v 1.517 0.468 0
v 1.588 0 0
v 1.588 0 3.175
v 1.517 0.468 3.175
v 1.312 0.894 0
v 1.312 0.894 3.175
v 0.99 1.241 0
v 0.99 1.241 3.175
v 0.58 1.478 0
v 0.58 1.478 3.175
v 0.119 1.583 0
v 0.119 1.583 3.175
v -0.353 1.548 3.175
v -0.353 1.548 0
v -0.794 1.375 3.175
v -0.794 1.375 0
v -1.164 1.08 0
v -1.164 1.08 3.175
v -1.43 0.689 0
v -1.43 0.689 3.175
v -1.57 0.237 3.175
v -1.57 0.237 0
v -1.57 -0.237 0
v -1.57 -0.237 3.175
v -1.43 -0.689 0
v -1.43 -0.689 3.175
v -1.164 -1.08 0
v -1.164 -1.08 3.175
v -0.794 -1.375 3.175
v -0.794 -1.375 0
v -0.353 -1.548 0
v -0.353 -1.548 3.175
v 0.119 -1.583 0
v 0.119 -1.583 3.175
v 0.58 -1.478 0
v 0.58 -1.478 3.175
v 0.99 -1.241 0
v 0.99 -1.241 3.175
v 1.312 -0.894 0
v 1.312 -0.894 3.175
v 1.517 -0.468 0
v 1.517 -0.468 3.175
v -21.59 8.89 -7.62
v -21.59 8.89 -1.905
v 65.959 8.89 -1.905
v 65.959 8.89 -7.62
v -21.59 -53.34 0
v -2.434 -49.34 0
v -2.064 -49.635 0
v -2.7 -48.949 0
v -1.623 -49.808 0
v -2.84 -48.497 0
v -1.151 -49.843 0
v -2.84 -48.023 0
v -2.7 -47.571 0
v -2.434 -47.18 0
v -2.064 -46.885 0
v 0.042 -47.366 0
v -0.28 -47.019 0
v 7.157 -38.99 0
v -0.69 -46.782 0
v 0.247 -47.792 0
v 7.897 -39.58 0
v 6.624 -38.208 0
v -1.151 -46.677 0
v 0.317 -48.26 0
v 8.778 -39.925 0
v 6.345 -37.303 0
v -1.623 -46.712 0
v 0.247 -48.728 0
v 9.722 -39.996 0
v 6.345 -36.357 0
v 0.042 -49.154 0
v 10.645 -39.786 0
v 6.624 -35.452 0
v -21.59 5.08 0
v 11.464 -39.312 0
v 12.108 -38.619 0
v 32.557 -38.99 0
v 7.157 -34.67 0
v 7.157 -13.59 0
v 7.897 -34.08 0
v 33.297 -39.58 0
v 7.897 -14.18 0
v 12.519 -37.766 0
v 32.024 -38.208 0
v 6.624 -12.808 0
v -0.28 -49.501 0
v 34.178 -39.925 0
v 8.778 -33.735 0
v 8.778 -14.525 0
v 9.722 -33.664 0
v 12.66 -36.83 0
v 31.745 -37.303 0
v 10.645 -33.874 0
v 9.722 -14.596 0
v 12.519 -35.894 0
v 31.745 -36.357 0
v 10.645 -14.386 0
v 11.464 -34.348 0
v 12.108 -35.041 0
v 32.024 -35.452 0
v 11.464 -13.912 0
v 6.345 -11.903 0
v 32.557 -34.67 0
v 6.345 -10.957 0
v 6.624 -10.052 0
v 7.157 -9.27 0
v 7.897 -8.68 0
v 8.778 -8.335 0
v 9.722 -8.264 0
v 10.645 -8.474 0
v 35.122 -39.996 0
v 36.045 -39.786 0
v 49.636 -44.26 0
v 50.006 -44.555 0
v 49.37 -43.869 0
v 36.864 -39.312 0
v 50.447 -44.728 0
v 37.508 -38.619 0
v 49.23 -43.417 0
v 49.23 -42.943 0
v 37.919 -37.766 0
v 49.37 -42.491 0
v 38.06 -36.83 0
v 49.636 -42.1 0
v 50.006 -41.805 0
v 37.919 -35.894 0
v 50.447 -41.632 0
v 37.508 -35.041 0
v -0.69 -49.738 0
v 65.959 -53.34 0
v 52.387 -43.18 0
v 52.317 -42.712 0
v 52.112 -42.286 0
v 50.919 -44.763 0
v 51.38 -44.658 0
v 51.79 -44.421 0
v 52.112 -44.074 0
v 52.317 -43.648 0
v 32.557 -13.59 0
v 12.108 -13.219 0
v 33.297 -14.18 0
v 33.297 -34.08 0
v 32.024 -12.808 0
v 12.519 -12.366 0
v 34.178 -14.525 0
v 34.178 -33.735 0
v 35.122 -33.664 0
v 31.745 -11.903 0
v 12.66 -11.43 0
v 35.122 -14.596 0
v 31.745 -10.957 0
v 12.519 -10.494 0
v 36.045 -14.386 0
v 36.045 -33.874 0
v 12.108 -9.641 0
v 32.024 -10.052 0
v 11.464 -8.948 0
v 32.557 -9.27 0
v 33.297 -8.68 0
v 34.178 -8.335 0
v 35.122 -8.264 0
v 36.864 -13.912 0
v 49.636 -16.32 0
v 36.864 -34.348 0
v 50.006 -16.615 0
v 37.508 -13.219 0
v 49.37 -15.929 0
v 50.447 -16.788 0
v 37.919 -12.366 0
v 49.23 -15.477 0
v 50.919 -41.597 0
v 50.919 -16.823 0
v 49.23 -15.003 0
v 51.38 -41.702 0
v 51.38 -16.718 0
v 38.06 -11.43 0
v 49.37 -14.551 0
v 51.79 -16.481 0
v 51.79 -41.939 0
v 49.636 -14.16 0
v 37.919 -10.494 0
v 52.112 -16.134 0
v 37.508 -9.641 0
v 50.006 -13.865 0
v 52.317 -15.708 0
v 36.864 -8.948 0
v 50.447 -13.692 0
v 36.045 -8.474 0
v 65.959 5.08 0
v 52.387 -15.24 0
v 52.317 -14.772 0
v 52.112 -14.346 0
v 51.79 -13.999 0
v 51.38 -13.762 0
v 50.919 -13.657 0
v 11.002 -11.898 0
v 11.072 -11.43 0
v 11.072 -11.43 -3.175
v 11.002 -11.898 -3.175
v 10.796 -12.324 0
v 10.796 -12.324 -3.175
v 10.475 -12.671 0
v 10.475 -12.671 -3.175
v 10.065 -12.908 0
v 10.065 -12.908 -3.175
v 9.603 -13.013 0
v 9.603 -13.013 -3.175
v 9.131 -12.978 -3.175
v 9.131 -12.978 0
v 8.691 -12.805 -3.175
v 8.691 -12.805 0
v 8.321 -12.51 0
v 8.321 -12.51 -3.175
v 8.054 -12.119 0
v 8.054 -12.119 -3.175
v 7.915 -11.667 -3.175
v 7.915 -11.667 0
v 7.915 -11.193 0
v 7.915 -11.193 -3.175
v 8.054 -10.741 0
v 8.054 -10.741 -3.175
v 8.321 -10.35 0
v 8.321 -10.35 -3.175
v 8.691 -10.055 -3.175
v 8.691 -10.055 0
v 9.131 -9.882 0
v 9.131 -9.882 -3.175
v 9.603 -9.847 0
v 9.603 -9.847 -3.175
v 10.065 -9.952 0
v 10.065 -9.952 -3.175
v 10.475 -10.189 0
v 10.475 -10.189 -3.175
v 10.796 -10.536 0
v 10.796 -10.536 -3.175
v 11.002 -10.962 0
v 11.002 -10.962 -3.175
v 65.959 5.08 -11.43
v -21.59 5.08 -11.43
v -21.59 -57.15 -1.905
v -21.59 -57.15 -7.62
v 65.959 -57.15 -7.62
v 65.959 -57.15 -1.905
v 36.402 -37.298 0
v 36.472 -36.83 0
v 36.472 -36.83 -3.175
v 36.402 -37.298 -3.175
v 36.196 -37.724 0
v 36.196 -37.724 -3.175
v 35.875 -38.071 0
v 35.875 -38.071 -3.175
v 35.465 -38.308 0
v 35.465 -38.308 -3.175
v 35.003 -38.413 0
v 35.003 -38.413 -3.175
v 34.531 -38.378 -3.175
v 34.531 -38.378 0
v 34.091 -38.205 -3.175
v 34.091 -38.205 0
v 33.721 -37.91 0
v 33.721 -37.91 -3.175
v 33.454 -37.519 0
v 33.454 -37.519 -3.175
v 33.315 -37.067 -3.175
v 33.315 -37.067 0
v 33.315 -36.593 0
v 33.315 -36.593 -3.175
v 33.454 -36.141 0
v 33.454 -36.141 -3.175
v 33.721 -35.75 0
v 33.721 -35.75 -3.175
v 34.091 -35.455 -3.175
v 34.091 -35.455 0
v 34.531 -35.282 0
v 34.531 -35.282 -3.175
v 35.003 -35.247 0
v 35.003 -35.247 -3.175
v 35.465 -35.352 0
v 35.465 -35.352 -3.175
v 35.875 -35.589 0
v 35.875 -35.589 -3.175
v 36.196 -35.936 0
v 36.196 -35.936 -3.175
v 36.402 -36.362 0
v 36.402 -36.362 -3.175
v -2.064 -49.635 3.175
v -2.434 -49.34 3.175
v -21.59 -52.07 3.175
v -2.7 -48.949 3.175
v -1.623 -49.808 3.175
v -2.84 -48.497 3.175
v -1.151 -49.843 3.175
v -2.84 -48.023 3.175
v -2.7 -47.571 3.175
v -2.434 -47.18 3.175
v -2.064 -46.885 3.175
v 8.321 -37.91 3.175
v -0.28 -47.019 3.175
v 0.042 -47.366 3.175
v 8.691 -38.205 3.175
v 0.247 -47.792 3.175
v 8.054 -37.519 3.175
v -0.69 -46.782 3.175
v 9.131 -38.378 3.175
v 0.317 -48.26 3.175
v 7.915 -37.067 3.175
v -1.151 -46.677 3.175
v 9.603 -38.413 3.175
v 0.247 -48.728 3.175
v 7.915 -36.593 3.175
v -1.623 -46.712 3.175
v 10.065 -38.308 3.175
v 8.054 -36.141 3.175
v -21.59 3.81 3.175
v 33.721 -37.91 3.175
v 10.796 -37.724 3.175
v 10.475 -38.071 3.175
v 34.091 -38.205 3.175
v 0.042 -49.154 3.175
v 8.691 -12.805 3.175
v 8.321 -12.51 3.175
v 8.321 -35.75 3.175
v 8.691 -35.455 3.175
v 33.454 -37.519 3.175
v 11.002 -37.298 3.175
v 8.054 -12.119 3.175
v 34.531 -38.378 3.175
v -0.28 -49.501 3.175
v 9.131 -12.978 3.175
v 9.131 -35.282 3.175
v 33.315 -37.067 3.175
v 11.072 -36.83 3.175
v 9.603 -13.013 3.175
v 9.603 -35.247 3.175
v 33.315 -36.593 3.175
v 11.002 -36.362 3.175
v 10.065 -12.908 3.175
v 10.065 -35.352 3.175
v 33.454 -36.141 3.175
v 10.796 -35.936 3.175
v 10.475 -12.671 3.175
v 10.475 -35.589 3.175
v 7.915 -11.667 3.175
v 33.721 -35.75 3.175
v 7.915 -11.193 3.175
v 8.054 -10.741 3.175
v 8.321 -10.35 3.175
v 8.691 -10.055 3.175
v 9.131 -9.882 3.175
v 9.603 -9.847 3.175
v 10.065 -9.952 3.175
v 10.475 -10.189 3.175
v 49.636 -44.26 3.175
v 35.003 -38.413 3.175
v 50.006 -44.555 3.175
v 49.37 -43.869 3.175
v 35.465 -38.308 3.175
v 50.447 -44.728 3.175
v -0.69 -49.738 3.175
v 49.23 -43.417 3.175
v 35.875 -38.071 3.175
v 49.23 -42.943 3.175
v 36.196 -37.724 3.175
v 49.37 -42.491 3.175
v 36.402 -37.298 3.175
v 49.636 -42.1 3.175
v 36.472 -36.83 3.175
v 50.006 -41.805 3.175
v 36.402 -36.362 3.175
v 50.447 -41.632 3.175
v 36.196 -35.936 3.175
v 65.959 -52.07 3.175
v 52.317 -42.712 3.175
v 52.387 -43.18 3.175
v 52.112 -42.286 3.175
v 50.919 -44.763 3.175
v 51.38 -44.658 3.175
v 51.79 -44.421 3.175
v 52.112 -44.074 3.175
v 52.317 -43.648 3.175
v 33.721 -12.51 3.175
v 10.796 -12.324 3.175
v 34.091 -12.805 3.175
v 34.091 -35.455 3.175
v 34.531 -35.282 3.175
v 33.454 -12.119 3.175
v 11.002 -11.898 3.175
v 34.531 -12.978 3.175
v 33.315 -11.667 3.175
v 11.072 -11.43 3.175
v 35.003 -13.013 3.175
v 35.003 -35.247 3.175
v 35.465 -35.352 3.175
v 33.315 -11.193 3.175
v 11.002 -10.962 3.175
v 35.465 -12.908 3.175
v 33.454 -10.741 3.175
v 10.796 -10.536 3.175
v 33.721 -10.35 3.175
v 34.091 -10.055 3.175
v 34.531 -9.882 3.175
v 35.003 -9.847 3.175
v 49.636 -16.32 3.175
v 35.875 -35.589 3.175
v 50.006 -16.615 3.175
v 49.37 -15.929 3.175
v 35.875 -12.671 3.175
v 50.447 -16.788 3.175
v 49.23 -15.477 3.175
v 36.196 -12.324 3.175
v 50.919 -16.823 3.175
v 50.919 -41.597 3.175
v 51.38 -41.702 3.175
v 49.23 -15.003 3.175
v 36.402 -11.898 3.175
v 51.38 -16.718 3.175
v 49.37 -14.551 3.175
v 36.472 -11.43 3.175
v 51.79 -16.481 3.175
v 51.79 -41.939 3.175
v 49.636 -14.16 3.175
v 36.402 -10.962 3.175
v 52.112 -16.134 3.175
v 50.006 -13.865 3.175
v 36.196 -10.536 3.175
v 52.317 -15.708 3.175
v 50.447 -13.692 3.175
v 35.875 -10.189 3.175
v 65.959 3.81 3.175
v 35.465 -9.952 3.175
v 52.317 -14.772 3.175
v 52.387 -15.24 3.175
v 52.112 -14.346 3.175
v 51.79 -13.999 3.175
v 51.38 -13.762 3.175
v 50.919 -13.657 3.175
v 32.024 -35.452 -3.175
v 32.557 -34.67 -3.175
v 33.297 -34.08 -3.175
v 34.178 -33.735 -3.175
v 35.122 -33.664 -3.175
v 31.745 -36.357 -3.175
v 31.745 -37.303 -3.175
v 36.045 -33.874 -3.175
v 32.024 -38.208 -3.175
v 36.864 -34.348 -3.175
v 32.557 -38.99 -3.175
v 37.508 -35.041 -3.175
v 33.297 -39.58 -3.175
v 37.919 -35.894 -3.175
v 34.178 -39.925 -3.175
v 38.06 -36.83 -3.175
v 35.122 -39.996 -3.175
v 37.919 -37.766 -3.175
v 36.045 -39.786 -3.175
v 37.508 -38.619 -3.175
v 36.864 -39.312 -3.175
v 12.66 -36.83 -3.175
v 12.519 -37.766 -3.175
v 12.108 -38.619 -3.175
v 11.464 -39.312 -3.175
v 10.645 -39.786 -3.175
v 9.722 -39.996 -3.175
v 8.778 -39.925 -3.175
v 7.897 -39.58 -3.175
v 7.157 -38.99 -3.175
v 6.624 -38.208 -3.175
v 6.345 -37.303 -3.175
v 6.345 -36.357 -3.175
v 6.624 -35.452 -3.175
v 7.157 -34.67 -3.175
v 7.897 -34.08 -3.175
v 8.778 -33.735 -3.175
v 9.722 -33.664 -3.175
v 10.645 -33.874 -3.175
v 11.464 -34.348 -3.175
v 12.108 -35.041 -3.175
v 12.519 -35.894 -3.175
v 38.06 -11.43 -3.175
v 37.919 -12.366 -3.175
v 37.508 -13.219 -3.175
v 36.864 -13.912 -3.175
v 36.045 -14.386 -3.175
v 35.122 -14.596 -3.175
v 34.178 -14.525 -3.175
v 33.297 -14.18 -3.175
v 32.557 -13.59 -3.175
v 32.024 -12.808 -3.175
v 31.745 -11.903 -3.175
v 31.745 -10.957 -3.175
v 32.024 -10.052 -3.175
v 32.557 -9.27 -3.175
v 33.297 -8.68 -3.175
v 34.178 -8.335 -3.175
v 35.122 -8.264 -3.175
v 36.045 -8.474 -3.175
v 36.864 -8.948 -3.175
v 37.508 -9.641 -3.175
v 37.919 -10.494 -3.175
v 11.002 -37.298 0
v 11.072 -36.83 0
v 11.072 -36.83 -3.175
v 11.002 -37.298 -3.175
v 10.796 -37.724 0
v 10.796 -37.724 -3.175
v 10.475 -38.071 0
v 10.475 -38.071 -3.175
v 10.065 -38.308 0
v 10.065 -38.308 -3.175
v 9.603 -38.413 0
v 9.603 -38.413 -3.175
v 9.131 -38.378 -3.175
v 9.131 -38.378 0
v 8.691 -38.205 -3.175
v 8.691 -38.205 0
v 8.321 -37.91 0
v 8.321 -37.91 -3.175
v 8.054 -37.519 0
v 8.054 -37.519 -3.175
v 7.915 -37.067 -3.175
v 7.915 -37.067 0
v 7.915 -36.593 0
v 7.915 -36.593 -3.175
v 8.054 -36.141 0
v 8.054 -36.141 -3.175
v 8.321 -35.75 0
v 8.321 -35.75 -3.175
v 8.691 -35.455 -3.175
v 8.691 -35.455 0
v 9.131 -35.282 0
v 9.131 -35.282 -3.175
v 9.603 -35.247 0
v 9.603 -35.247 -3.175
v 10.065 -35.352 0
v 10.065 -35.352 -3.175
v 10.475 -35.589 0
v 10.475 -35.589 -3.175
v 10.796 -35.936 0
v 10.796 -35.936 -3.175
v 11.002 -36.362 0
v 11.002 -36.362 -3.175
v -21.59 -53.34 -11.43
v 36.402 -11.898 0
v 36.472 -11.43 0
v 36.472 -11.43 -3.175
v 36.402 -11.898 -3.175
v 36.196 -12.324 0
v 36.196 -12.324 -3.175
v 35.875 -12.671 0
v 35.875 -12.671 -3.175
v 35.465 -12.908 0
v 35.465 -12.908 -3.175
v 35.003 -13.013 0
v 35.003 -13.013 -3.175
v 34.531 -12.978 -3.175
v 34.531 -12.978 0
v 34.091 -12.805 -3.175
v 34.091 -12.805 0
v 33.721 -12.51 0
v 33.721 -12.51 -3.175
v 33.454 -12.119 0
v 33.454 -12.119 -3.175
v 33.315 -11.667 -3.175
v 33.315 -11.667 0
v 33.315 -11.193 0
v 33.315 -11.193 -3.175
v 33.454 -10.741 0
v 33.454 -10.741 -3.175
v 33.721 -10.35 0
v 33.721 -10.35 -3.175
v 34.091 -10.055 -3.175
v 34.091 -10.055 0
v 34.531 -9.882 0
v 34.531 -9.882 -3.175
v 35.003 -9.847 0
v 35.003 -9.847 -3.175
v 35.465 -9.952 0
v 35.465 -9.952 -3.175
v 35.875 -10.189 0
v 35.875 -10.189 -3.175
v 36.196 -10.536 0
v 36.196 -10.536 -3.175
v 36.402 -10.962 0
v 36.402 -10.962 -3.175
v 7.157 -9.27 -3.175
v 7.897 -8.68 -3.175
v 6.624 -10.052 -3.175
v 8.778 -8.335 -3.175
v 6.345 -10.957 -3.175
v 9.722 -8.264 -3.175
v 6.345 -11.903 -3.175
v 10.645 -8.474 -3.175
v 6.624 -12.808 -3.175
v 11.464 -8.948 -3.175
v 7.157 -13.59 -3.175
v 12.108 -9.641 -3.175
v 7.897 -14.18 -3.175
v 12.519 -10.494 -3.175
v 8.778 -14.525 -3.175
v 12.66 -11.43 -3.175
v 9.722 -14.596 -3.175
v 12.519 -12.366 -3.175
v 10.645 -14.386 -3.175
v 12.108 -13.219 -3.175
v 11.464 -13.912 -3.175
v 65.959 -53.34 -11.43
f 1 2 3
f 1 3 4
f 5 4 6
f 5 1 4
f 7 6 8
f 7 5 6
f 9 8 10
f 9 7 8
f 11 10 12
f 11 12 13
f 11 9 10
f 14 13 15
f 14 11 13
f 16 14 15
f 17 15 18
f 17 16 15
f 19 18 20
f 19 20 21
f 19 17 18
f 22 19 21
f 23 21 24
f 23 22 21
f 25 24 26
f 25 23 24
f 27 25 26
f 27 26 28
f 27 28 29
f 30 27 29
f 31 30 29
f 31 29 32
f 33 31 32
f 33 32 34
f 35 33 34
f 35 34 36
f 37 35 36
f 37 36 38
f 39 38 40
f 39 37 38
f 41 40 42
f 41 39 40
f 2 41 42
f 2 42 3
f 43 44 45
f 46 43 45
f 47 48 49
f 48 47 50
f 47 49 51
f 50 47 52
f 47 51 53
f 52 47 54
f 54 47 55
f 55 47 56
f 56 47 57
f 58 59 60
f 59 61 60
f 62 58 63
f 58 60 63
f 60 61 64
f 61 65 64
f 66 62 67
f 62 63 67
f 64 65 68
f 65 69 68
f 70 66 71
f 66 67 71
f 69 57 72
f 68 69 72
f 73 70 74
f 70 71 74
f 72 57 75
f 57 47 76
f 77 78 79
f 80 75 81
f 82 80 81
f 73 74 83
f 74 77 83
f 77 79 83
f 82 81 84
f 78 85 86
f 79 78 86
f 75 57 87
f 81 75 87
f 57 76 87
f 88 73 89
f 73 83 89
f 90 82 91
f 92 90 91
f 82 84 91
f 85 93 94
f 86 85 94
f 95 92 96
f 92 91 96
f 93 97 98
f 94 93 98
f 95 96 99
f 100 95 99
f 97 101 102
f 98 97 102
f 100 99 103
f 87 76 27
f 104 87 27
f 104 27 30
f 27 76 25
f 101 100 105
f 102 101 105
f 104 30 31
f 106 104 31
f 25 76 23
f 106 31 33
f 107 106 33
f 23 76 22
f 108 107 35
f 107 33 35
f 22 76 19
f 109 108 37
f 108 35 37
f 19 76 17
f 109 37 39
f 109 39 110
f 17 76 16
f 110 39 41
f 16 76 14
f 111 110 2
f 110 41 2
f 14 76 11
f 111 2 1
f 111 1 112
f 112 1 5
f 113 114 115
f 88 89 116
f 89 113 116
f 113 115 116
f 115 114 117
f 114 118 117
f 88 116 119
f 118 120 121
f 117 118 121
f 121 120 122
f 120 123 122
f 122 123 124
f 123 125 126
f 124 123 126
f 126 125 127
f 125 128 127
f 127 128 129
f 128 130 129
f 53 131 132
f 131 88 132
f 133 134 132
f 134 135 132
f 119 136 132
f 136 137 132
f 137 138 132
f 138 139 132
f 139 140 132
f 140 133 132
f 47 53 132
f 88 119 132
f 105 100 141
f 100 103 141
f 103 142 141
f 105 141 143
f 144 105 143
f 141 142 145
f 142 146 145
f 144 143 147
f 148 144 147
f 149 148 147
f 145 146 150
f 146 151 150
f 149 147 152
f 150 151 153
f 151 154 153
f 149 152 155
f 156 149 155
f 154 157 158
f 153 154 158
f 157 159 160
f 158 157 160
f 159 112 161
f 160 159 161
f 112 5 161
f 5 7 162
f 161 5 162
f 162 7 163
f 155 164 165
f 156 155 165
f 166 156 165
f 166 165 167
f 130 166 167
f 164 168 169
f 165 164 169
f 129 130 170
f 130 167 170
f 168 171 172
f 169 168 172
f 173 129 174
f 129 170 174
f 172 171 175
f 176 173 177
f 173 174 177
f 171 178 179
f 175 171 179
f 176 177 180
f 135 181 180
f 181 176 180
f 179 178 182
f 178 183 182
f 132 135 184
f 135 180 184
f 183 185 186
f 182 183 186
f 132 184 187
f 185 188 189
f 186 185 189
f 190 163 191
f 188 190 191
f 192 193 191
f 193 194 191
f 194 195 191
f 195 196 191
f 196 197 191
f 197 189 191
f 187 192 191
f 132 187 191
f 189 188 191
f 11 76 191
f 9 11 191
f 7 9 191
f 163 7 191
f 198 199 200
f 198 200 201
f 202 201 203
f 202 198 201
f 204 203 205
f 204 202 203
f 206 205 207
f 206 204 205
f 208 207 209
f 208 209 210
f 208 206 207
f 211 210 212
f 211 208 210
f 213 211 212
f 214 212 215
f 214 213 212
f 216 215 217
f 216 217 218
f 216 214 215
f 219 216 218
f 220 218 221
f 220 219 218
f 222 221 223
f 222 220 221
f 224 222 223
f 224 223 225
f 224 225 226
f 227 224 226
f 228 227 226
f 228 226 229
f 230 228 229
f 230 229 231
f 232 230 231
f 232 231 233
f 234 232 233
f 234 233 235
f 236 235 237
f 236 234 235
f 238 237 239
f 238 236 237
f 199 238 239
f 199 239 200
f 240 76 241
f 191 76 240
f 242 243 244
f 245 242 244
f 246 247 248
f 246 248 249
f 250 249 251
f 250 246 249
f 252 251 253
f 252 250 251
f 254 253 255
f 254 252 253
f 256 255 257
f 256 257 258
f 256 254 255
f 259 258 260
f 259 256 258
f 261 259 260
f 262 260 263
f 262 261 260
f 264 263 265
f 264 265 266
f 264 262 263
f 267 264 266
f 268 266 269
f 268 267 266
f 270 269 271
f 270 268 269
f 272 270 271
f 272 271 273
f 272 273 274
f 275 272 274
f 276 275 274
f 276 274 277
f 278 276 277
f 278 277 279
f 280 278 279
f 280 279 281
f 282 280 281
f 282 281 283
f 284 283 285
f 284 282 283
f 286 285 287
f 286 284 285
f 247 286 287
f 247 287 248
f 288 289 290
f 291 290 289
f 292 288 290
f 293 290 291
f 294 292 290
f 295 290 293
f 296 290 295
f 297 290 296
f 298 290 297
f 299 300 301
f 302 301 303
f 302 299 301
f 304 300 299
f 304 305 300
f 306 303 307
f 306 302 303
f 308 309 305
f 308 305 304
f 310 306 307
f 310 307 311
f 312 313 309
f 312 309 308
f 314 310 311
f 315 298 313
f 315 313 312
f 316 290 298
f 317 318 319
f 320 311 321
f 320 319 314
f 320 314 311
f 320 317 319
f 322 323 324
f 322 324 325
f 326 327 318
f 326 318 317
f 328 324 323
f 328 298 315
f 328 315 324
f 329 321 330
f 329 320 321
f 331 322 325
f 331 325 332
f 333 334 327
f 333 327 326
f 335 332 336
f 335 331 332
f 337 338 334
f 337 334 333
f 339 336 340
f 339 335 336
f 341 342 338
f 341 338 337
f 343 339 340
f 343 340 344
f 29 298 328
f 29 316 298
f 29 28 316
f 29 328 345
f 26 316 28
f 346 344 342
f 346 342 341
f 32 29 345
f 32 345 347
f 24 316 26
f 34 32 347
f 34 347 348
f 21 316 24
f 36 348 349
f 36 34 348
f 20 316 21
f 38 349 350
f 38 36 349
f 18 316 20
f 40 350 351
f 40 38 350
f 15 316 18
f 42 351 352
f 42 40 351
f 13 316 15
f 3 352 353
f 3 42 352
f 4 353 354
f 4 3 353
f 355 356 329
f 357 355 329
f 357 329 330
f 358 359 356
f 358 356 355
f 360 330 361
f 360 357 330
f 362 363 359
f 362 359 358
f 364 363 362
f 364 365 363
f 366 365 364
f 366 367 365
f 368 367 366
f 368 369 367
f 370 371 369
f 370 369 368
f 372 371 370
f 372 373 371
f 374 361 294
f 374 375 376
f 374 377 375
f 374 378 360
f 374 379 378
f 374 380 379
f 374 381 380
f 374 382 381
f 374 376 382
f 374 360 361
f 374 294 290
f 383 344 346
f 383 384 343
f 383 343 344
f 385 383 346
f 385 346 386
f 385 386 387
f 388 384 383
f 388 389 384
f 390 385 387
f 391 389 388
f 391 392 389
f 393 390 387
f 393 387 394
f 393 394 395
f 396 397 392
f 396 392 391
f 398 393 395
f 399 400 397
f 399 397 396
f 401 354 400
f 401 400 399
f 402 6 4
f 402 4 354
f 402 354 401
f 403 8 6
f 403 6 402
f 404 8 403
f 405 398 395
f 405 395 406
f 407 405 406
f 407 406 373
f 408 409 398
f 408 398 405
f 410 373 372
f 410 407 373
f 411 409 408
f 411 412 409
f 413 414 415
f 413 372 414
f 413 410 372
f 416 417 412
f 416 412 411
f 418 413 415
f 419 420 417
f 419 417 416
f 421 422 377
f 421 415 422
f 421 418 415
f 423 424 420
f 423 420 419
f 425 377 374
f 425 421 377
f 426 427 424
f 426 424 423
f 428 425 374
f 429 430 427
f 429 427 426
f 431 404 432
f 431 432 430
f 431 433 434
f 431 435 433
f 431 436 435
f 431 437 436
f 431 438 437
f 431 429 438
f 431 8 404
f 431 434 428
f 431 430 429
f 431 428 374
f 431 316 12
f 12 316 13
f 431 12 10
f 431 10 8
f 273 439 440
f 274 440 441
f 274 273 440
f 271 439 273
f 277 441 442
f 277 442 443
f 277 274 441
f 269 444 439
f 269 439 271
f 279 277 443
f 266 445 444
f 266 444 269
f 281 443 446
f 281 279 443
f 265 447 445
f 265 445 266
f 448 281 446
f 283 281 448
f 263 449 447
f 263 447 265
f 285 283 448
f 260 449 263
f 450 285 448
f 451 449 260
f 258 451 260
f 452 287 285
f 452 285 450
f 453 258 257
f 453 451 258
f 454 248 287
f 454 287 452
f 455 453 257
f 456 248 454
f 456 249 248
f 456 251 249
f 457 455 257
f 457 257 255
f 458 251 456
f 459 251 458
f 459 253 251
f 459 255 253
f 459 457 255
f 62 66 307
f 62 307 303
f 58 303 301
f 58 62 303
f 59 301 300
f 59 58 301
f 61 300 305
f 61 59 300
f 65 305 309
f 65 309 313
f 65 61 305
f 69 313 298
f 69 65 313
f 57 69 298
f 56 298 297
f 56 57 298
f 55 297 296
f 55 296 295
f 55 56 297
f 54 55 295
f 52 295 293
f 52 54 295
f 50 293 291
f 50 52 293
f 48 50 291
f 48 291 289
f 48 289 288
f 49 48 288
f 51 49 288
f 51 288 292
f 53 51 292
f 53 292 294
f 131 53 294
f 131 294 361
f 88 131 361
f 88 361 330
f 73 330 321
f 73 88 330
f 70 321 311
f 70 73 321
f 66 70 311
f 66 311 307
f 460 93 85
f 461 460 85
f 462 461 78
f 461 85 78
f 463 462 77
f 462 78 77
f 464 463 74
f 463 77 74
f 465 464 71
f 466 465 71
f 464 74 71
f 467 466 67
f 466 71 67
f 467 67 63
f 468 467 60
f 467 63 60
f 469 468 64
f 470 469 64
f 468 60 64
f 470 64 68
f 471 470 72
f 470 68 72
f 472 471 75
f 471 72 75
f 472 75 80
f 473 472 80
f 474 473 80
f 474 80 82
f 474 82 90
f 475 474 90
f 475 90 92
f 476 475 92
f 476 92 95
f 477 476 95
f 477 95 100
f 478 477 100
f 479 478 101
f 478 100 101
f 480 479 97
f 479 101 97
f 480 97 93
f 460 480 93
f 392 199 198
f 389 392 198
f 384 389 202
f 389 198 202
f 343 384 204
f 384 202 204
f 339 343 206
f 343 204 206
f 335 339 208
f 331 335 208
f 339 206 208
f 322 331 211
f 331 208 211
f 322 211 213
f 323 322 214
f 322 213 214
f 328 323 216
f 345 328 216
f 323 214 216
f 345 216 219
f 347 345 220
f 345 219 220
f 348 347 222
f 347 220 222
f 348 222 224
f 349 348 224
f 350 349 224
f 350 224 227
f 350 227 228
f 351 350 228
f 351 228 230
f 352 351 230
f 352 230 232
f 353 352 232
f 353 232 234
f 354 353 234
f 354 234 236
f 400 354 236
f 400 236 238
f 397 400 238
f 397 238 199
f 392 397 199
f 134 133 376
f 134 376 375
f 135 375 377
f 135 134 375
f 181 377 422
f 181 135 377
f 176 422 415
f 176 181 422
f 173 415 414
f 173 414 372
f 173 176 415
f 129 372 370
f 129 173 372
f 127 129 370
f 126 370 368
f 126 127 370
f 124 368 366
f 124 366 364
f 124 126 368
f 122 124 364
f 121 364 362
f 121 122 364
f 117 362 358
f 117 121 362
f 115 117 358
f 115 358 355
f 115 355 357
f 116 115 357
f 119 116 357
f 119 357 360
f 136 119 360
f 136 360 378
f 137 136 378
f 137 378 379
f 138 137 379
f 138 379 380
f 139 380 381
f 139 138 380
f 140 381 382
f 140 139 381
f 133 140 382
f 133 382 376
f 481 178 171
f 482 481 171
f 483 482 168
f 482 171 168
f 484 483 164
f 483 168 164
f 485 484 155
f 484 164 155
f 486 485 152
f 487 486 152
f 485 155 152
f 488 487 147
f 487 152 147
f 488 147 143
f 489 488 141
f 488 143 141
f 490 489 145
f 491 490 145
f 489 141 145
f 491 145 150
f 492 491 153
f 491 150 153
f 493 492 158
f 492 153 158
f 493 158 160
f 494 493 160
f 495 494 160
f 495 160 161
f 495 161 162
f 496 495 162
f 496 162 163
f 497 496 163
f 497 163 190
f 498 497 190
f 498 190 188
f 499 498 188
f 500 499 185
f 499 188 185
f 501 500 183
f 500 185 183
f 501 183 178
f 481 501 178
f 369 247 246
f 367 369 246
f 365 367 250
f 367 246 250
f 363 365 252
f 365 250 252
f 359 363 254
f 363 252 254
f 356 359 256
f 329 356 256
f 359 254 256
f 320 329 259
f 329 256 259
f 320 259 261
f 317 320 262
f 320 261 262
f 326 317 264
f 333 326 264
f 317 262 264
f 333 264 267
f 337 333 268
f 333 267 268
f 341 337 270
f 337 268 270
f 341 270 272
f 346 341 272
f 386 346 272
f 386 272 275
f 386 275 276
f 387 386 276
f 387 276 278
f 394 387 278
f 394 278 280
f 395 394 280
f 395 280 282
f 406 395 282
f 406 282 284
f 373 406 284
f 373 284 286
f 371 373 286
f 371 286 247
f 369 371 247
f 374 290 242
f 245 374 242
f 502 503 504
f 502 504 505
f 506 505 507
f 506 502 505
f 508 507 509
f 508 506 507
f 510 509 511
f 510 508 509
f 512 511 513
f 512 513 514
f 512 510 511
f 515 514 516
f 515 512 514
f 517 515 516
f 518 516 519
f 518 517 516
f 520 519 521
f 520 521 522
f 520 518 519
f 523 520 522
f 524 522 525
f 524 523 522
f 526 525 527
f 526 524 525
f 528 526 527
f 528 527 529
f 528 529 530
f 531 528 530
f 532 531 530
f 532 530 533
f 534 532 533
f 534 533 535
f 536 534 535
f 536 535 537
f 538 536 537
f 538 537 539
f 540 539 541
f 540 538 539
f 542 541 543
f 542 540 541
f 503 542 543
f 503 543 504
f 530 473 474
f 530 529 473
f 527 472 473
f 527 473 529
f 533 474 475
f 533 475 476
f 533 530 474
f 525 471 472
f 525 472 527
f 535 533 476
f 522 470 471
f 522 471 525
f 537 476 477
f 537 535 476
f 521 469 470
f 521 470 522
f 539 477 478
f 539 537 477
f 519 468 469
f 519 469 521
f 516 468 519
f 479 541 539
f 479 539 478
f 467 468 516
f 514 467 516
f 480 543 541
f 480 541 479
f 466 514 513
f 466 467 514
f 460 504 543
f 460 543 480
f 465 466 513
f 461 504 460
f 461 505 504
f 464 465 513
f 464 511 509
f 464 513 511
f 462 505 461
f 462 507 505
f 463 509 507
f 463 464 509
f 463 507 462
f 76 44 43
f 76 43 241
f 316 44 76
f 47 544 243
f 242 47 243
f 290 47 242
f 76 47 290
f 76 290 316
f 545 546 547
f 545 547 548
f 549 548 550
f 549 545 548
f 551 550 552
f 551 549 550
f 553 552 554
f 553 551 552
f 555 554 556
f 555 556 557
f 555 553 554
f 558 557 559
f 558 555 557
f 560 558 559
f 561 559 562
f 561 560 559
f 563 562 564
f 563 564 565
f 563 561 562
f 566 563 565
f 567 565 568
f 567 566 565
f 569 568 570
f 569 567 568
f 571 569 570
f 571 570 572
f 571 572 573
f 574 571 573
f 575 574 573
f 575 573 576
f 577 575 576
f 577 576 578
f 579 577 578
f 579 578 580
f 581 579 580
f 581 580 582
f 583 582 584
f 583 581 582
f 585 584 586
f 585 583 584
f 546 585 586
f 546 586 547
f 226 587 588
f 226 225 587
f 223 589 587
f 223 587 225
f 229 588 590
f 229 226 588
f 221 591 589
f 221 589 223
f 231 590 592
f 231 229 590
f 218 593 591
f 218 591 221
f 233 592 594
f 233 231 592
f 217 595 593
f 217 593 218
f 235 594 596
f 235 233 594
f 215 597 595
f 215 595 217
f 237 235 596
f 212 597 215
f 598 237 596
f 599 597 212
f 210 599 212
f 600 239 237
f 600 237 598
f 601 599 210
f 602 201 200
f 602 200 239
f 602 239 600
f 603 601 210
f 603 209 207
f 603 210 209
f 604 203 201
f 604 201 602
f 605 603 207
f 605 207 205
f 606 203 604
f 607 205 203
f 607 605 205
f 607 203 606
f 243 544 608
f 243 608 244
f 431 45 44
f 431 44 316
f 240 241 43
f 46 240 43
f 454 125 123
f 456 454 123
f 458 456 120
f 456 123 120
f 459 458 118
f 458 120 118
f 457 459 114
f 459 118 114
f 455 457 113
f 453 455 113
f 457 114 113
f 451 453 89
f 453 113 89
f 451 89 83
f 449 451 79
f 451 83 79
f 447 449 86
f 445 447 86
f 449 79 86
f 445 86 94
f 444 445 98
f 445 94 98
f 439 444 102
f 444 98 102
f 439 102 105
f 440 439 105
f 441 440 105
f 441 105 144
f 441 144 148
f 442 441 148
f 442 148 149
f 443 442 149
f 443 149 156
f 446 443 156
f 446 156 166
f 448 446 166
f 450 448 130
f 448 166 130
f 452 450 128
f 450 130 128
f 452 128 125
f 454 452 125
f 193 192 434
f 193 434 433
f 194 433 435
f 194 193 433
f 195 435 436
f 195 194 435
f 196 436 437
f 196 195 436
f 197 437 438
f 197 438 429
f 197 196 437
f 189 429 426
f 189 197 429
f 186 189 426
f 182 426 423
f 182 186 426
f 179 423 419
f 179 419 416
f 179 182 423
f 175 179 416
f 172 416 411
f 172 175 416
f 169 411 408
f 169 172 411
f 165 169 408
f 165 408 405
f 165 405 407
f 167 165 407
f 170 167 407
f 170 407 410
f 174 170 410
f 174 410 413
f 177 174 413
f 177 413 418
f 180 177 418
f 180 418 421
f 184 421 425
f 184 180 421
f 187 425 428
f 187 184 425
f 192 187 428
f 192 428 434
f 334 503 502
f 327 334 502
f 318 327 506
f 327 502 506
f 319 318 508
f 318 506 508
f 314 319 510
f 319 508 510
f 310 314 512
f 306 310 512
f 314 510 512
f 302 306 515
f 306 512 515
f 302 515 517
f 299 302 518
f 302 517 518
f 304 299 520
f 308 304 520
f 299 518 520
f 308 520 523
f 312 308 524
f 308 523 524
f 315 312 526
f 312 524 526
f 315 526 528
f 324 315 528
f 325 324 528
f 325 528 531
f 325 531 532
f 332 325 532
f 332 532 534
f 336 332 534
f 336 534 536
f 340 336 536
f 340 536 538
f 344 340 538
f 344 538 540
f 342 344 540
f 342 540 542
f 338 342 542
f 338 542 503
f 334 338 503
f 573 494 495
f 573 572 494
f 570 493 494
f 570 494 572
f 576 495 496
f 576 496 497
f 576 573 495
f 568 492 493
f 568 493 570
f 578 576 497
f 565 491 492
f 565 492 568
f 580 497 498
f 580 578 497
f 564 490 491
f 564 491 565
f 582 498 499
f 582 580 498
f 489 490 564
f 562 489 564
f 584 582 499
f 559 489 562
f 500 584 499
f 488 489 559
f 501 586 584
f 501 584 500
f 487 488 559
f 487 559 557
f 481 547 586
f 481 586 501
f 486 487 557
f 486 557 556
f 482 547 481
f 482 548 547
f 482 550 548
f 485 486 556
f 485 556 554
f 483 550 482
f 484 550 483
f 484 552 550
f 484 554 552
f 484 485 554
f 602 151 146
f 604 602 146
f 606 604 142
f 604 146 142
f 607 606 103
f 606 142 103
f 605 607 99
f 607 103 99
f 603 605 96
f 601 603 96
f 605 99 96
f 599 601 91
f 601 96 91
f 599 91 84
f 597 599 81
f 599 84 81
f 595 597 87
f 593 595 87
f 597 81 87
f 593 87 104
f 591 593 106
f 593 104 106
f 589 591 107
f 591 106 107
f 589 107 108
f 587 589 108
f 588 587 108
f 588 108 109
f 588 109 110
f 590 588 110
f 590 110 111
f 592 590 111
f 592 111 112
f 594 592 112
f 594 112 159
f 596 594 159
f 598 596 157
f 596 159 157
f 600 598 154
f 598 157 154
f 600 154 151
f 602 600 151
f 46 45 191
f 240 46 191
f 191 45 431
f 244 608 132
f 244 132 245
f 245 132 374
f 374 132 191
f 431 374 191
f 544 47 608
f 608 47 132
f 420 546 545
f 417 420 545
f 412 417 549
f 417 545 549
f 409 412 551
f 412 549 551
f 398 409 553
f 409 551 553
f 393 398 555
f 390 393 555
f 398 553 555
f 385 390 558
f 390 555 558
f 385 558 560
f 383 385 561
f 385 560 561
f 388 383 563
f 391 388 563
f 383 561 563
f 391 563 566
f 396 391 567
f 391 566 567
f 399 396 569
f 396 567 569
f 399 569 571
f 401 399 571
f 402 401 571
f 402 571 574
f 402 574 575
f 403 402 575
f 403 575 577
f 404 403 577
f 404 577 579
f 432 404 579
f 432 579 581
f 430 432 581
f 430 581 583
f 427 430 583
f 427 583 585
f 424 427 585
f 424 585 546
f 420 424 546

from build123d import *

# Parameters (mm, degrees)
F0_W        = 87.5494211584
F0_H        = 66.04
F0_R        = 1.5875
F1_DEPTH    = 3.175
F2_R        = 3.175
F2_R_2      = 1.5875
F3_DEPTH    = 3.175
F4_DEPTH    = 25.4
F5_W        = 87.5494211584
F5_H        = 3.81
F6_DEPTH    = 12.7
F7_T1_DEPTH = 113.6777203162


# Not quite as in the source:
# - a fillet or chamfer that OpenCascade refuses, or shapes differently, is made with other operations: its cross-section is extruded or revolved along the edge and cut away or added


with BuildPart() as f1:
    # F0 (on Top) → F1 (new body)
    with BuildSketch(Plane.XY):
        with Locations((22.1847105792, -24.13)):
            Rectangle(F0_W, F0_H)
        with Locations((-1.27, -48.26)):
            Circle(F0_R, mode=Mode.SUBTRACT)
        with Locations((50.8, -43.18)):
            Circle(F0_R, mode=Mode.SUBTRACT)
        Circle(F0_R, mode=Mode.SUBTRACT)
        with Locations((50.8, -15.24)):
            Circle(F0_R, mode=Mode.SUBTRACT)
    extrude(amount=F1_DEPTH)

    # F2 (on face) → F3 (join)
    with BuildSketch(Plane(origin=(0, 0, 0), x_dir=(1, 0, 0), z_dir=(0, 0, -1))):
        with Locations((9.4847105792, 11.43)):
            Circle(F2_R)
        with Locations((9.4847105792, 11.43)):
            Circle(F2_R_2, mode=Mode.SUBTRACT)
        with Locations((9.4847105792, 36.83)):
            Circle(F2_R)
        with Locations((9.4847105792, 36.83)):
            Circle(F2_R_2, mode=Mode.SUBTRACT)
        with Locations((34.8847105792, 36.83)):
            Circle(F2_R)
        with Locations((34.8847105792, 36.83)):
            Circle(F2_R_2, mode=Mode.SUBTRACT)
        with Locations((34.8847105792, 11.43)):
            Circle(F2_R)
        with Locations((34.8847105792, 11.43)):
            Circle(F2_R_2, mode=Mode.SUBTRACT)
    extrude(amount=F3_DEPTH)

    # F4 (cut): faces of the model
    f4_faces = [f1.faces().sort_by_distance(p)[0] for p in [
        (9.4847105792, -11.43, 0),
        (9.4847105792, -36.83, 0),
        (34.8847105792, -36.83, 0),
        (34.8847105792, -11.43, 0),
    ]]
    extrude(f4_faces, amount=-F4_DEPTH, mode=Mode.SUBTRACT)

    # F5 (on face) → F6 (join)
    with BuildSketch(Plane(origin=(0, 0, 0), x_dir=(1, 0, 0), z_dir=(0, 0, -1))):
        with Locations((22.1847105792, -6.985)):
            Rectangle(F5_W, F5_H)
        with Locations((22.1847105792, 55.245)):
            Rectangle(F5_W, F5_H)
    extrude(amount=F6_DEPTH)

    # F7: chamfer of 5.08 on 4 edges, made by hand

    # F7_s2 → F7_t1 (cut)
    with BuildSketch(Plane.YZ.offset(-34.6541495789)):
        Polygon((8.89, -1.905), (3.81, 3.175), (8.89, 3.175), align=None)
        Polygon((-52.07, 3.175), (-57.15, -1.905), (-57.15, 3.175), align=None)
        Polygon((3.81, -12.7), (8.89, -7.62), (8.89, -12.7), align=None)
        Polygon((-52.07, -12.7), (-57.15, -7.62), (-57.15, -12.7), align=None)
    extrude(amount=F7_T1_DEPTH, mode=Mode.SUBTRACT)


solid = f1.part
